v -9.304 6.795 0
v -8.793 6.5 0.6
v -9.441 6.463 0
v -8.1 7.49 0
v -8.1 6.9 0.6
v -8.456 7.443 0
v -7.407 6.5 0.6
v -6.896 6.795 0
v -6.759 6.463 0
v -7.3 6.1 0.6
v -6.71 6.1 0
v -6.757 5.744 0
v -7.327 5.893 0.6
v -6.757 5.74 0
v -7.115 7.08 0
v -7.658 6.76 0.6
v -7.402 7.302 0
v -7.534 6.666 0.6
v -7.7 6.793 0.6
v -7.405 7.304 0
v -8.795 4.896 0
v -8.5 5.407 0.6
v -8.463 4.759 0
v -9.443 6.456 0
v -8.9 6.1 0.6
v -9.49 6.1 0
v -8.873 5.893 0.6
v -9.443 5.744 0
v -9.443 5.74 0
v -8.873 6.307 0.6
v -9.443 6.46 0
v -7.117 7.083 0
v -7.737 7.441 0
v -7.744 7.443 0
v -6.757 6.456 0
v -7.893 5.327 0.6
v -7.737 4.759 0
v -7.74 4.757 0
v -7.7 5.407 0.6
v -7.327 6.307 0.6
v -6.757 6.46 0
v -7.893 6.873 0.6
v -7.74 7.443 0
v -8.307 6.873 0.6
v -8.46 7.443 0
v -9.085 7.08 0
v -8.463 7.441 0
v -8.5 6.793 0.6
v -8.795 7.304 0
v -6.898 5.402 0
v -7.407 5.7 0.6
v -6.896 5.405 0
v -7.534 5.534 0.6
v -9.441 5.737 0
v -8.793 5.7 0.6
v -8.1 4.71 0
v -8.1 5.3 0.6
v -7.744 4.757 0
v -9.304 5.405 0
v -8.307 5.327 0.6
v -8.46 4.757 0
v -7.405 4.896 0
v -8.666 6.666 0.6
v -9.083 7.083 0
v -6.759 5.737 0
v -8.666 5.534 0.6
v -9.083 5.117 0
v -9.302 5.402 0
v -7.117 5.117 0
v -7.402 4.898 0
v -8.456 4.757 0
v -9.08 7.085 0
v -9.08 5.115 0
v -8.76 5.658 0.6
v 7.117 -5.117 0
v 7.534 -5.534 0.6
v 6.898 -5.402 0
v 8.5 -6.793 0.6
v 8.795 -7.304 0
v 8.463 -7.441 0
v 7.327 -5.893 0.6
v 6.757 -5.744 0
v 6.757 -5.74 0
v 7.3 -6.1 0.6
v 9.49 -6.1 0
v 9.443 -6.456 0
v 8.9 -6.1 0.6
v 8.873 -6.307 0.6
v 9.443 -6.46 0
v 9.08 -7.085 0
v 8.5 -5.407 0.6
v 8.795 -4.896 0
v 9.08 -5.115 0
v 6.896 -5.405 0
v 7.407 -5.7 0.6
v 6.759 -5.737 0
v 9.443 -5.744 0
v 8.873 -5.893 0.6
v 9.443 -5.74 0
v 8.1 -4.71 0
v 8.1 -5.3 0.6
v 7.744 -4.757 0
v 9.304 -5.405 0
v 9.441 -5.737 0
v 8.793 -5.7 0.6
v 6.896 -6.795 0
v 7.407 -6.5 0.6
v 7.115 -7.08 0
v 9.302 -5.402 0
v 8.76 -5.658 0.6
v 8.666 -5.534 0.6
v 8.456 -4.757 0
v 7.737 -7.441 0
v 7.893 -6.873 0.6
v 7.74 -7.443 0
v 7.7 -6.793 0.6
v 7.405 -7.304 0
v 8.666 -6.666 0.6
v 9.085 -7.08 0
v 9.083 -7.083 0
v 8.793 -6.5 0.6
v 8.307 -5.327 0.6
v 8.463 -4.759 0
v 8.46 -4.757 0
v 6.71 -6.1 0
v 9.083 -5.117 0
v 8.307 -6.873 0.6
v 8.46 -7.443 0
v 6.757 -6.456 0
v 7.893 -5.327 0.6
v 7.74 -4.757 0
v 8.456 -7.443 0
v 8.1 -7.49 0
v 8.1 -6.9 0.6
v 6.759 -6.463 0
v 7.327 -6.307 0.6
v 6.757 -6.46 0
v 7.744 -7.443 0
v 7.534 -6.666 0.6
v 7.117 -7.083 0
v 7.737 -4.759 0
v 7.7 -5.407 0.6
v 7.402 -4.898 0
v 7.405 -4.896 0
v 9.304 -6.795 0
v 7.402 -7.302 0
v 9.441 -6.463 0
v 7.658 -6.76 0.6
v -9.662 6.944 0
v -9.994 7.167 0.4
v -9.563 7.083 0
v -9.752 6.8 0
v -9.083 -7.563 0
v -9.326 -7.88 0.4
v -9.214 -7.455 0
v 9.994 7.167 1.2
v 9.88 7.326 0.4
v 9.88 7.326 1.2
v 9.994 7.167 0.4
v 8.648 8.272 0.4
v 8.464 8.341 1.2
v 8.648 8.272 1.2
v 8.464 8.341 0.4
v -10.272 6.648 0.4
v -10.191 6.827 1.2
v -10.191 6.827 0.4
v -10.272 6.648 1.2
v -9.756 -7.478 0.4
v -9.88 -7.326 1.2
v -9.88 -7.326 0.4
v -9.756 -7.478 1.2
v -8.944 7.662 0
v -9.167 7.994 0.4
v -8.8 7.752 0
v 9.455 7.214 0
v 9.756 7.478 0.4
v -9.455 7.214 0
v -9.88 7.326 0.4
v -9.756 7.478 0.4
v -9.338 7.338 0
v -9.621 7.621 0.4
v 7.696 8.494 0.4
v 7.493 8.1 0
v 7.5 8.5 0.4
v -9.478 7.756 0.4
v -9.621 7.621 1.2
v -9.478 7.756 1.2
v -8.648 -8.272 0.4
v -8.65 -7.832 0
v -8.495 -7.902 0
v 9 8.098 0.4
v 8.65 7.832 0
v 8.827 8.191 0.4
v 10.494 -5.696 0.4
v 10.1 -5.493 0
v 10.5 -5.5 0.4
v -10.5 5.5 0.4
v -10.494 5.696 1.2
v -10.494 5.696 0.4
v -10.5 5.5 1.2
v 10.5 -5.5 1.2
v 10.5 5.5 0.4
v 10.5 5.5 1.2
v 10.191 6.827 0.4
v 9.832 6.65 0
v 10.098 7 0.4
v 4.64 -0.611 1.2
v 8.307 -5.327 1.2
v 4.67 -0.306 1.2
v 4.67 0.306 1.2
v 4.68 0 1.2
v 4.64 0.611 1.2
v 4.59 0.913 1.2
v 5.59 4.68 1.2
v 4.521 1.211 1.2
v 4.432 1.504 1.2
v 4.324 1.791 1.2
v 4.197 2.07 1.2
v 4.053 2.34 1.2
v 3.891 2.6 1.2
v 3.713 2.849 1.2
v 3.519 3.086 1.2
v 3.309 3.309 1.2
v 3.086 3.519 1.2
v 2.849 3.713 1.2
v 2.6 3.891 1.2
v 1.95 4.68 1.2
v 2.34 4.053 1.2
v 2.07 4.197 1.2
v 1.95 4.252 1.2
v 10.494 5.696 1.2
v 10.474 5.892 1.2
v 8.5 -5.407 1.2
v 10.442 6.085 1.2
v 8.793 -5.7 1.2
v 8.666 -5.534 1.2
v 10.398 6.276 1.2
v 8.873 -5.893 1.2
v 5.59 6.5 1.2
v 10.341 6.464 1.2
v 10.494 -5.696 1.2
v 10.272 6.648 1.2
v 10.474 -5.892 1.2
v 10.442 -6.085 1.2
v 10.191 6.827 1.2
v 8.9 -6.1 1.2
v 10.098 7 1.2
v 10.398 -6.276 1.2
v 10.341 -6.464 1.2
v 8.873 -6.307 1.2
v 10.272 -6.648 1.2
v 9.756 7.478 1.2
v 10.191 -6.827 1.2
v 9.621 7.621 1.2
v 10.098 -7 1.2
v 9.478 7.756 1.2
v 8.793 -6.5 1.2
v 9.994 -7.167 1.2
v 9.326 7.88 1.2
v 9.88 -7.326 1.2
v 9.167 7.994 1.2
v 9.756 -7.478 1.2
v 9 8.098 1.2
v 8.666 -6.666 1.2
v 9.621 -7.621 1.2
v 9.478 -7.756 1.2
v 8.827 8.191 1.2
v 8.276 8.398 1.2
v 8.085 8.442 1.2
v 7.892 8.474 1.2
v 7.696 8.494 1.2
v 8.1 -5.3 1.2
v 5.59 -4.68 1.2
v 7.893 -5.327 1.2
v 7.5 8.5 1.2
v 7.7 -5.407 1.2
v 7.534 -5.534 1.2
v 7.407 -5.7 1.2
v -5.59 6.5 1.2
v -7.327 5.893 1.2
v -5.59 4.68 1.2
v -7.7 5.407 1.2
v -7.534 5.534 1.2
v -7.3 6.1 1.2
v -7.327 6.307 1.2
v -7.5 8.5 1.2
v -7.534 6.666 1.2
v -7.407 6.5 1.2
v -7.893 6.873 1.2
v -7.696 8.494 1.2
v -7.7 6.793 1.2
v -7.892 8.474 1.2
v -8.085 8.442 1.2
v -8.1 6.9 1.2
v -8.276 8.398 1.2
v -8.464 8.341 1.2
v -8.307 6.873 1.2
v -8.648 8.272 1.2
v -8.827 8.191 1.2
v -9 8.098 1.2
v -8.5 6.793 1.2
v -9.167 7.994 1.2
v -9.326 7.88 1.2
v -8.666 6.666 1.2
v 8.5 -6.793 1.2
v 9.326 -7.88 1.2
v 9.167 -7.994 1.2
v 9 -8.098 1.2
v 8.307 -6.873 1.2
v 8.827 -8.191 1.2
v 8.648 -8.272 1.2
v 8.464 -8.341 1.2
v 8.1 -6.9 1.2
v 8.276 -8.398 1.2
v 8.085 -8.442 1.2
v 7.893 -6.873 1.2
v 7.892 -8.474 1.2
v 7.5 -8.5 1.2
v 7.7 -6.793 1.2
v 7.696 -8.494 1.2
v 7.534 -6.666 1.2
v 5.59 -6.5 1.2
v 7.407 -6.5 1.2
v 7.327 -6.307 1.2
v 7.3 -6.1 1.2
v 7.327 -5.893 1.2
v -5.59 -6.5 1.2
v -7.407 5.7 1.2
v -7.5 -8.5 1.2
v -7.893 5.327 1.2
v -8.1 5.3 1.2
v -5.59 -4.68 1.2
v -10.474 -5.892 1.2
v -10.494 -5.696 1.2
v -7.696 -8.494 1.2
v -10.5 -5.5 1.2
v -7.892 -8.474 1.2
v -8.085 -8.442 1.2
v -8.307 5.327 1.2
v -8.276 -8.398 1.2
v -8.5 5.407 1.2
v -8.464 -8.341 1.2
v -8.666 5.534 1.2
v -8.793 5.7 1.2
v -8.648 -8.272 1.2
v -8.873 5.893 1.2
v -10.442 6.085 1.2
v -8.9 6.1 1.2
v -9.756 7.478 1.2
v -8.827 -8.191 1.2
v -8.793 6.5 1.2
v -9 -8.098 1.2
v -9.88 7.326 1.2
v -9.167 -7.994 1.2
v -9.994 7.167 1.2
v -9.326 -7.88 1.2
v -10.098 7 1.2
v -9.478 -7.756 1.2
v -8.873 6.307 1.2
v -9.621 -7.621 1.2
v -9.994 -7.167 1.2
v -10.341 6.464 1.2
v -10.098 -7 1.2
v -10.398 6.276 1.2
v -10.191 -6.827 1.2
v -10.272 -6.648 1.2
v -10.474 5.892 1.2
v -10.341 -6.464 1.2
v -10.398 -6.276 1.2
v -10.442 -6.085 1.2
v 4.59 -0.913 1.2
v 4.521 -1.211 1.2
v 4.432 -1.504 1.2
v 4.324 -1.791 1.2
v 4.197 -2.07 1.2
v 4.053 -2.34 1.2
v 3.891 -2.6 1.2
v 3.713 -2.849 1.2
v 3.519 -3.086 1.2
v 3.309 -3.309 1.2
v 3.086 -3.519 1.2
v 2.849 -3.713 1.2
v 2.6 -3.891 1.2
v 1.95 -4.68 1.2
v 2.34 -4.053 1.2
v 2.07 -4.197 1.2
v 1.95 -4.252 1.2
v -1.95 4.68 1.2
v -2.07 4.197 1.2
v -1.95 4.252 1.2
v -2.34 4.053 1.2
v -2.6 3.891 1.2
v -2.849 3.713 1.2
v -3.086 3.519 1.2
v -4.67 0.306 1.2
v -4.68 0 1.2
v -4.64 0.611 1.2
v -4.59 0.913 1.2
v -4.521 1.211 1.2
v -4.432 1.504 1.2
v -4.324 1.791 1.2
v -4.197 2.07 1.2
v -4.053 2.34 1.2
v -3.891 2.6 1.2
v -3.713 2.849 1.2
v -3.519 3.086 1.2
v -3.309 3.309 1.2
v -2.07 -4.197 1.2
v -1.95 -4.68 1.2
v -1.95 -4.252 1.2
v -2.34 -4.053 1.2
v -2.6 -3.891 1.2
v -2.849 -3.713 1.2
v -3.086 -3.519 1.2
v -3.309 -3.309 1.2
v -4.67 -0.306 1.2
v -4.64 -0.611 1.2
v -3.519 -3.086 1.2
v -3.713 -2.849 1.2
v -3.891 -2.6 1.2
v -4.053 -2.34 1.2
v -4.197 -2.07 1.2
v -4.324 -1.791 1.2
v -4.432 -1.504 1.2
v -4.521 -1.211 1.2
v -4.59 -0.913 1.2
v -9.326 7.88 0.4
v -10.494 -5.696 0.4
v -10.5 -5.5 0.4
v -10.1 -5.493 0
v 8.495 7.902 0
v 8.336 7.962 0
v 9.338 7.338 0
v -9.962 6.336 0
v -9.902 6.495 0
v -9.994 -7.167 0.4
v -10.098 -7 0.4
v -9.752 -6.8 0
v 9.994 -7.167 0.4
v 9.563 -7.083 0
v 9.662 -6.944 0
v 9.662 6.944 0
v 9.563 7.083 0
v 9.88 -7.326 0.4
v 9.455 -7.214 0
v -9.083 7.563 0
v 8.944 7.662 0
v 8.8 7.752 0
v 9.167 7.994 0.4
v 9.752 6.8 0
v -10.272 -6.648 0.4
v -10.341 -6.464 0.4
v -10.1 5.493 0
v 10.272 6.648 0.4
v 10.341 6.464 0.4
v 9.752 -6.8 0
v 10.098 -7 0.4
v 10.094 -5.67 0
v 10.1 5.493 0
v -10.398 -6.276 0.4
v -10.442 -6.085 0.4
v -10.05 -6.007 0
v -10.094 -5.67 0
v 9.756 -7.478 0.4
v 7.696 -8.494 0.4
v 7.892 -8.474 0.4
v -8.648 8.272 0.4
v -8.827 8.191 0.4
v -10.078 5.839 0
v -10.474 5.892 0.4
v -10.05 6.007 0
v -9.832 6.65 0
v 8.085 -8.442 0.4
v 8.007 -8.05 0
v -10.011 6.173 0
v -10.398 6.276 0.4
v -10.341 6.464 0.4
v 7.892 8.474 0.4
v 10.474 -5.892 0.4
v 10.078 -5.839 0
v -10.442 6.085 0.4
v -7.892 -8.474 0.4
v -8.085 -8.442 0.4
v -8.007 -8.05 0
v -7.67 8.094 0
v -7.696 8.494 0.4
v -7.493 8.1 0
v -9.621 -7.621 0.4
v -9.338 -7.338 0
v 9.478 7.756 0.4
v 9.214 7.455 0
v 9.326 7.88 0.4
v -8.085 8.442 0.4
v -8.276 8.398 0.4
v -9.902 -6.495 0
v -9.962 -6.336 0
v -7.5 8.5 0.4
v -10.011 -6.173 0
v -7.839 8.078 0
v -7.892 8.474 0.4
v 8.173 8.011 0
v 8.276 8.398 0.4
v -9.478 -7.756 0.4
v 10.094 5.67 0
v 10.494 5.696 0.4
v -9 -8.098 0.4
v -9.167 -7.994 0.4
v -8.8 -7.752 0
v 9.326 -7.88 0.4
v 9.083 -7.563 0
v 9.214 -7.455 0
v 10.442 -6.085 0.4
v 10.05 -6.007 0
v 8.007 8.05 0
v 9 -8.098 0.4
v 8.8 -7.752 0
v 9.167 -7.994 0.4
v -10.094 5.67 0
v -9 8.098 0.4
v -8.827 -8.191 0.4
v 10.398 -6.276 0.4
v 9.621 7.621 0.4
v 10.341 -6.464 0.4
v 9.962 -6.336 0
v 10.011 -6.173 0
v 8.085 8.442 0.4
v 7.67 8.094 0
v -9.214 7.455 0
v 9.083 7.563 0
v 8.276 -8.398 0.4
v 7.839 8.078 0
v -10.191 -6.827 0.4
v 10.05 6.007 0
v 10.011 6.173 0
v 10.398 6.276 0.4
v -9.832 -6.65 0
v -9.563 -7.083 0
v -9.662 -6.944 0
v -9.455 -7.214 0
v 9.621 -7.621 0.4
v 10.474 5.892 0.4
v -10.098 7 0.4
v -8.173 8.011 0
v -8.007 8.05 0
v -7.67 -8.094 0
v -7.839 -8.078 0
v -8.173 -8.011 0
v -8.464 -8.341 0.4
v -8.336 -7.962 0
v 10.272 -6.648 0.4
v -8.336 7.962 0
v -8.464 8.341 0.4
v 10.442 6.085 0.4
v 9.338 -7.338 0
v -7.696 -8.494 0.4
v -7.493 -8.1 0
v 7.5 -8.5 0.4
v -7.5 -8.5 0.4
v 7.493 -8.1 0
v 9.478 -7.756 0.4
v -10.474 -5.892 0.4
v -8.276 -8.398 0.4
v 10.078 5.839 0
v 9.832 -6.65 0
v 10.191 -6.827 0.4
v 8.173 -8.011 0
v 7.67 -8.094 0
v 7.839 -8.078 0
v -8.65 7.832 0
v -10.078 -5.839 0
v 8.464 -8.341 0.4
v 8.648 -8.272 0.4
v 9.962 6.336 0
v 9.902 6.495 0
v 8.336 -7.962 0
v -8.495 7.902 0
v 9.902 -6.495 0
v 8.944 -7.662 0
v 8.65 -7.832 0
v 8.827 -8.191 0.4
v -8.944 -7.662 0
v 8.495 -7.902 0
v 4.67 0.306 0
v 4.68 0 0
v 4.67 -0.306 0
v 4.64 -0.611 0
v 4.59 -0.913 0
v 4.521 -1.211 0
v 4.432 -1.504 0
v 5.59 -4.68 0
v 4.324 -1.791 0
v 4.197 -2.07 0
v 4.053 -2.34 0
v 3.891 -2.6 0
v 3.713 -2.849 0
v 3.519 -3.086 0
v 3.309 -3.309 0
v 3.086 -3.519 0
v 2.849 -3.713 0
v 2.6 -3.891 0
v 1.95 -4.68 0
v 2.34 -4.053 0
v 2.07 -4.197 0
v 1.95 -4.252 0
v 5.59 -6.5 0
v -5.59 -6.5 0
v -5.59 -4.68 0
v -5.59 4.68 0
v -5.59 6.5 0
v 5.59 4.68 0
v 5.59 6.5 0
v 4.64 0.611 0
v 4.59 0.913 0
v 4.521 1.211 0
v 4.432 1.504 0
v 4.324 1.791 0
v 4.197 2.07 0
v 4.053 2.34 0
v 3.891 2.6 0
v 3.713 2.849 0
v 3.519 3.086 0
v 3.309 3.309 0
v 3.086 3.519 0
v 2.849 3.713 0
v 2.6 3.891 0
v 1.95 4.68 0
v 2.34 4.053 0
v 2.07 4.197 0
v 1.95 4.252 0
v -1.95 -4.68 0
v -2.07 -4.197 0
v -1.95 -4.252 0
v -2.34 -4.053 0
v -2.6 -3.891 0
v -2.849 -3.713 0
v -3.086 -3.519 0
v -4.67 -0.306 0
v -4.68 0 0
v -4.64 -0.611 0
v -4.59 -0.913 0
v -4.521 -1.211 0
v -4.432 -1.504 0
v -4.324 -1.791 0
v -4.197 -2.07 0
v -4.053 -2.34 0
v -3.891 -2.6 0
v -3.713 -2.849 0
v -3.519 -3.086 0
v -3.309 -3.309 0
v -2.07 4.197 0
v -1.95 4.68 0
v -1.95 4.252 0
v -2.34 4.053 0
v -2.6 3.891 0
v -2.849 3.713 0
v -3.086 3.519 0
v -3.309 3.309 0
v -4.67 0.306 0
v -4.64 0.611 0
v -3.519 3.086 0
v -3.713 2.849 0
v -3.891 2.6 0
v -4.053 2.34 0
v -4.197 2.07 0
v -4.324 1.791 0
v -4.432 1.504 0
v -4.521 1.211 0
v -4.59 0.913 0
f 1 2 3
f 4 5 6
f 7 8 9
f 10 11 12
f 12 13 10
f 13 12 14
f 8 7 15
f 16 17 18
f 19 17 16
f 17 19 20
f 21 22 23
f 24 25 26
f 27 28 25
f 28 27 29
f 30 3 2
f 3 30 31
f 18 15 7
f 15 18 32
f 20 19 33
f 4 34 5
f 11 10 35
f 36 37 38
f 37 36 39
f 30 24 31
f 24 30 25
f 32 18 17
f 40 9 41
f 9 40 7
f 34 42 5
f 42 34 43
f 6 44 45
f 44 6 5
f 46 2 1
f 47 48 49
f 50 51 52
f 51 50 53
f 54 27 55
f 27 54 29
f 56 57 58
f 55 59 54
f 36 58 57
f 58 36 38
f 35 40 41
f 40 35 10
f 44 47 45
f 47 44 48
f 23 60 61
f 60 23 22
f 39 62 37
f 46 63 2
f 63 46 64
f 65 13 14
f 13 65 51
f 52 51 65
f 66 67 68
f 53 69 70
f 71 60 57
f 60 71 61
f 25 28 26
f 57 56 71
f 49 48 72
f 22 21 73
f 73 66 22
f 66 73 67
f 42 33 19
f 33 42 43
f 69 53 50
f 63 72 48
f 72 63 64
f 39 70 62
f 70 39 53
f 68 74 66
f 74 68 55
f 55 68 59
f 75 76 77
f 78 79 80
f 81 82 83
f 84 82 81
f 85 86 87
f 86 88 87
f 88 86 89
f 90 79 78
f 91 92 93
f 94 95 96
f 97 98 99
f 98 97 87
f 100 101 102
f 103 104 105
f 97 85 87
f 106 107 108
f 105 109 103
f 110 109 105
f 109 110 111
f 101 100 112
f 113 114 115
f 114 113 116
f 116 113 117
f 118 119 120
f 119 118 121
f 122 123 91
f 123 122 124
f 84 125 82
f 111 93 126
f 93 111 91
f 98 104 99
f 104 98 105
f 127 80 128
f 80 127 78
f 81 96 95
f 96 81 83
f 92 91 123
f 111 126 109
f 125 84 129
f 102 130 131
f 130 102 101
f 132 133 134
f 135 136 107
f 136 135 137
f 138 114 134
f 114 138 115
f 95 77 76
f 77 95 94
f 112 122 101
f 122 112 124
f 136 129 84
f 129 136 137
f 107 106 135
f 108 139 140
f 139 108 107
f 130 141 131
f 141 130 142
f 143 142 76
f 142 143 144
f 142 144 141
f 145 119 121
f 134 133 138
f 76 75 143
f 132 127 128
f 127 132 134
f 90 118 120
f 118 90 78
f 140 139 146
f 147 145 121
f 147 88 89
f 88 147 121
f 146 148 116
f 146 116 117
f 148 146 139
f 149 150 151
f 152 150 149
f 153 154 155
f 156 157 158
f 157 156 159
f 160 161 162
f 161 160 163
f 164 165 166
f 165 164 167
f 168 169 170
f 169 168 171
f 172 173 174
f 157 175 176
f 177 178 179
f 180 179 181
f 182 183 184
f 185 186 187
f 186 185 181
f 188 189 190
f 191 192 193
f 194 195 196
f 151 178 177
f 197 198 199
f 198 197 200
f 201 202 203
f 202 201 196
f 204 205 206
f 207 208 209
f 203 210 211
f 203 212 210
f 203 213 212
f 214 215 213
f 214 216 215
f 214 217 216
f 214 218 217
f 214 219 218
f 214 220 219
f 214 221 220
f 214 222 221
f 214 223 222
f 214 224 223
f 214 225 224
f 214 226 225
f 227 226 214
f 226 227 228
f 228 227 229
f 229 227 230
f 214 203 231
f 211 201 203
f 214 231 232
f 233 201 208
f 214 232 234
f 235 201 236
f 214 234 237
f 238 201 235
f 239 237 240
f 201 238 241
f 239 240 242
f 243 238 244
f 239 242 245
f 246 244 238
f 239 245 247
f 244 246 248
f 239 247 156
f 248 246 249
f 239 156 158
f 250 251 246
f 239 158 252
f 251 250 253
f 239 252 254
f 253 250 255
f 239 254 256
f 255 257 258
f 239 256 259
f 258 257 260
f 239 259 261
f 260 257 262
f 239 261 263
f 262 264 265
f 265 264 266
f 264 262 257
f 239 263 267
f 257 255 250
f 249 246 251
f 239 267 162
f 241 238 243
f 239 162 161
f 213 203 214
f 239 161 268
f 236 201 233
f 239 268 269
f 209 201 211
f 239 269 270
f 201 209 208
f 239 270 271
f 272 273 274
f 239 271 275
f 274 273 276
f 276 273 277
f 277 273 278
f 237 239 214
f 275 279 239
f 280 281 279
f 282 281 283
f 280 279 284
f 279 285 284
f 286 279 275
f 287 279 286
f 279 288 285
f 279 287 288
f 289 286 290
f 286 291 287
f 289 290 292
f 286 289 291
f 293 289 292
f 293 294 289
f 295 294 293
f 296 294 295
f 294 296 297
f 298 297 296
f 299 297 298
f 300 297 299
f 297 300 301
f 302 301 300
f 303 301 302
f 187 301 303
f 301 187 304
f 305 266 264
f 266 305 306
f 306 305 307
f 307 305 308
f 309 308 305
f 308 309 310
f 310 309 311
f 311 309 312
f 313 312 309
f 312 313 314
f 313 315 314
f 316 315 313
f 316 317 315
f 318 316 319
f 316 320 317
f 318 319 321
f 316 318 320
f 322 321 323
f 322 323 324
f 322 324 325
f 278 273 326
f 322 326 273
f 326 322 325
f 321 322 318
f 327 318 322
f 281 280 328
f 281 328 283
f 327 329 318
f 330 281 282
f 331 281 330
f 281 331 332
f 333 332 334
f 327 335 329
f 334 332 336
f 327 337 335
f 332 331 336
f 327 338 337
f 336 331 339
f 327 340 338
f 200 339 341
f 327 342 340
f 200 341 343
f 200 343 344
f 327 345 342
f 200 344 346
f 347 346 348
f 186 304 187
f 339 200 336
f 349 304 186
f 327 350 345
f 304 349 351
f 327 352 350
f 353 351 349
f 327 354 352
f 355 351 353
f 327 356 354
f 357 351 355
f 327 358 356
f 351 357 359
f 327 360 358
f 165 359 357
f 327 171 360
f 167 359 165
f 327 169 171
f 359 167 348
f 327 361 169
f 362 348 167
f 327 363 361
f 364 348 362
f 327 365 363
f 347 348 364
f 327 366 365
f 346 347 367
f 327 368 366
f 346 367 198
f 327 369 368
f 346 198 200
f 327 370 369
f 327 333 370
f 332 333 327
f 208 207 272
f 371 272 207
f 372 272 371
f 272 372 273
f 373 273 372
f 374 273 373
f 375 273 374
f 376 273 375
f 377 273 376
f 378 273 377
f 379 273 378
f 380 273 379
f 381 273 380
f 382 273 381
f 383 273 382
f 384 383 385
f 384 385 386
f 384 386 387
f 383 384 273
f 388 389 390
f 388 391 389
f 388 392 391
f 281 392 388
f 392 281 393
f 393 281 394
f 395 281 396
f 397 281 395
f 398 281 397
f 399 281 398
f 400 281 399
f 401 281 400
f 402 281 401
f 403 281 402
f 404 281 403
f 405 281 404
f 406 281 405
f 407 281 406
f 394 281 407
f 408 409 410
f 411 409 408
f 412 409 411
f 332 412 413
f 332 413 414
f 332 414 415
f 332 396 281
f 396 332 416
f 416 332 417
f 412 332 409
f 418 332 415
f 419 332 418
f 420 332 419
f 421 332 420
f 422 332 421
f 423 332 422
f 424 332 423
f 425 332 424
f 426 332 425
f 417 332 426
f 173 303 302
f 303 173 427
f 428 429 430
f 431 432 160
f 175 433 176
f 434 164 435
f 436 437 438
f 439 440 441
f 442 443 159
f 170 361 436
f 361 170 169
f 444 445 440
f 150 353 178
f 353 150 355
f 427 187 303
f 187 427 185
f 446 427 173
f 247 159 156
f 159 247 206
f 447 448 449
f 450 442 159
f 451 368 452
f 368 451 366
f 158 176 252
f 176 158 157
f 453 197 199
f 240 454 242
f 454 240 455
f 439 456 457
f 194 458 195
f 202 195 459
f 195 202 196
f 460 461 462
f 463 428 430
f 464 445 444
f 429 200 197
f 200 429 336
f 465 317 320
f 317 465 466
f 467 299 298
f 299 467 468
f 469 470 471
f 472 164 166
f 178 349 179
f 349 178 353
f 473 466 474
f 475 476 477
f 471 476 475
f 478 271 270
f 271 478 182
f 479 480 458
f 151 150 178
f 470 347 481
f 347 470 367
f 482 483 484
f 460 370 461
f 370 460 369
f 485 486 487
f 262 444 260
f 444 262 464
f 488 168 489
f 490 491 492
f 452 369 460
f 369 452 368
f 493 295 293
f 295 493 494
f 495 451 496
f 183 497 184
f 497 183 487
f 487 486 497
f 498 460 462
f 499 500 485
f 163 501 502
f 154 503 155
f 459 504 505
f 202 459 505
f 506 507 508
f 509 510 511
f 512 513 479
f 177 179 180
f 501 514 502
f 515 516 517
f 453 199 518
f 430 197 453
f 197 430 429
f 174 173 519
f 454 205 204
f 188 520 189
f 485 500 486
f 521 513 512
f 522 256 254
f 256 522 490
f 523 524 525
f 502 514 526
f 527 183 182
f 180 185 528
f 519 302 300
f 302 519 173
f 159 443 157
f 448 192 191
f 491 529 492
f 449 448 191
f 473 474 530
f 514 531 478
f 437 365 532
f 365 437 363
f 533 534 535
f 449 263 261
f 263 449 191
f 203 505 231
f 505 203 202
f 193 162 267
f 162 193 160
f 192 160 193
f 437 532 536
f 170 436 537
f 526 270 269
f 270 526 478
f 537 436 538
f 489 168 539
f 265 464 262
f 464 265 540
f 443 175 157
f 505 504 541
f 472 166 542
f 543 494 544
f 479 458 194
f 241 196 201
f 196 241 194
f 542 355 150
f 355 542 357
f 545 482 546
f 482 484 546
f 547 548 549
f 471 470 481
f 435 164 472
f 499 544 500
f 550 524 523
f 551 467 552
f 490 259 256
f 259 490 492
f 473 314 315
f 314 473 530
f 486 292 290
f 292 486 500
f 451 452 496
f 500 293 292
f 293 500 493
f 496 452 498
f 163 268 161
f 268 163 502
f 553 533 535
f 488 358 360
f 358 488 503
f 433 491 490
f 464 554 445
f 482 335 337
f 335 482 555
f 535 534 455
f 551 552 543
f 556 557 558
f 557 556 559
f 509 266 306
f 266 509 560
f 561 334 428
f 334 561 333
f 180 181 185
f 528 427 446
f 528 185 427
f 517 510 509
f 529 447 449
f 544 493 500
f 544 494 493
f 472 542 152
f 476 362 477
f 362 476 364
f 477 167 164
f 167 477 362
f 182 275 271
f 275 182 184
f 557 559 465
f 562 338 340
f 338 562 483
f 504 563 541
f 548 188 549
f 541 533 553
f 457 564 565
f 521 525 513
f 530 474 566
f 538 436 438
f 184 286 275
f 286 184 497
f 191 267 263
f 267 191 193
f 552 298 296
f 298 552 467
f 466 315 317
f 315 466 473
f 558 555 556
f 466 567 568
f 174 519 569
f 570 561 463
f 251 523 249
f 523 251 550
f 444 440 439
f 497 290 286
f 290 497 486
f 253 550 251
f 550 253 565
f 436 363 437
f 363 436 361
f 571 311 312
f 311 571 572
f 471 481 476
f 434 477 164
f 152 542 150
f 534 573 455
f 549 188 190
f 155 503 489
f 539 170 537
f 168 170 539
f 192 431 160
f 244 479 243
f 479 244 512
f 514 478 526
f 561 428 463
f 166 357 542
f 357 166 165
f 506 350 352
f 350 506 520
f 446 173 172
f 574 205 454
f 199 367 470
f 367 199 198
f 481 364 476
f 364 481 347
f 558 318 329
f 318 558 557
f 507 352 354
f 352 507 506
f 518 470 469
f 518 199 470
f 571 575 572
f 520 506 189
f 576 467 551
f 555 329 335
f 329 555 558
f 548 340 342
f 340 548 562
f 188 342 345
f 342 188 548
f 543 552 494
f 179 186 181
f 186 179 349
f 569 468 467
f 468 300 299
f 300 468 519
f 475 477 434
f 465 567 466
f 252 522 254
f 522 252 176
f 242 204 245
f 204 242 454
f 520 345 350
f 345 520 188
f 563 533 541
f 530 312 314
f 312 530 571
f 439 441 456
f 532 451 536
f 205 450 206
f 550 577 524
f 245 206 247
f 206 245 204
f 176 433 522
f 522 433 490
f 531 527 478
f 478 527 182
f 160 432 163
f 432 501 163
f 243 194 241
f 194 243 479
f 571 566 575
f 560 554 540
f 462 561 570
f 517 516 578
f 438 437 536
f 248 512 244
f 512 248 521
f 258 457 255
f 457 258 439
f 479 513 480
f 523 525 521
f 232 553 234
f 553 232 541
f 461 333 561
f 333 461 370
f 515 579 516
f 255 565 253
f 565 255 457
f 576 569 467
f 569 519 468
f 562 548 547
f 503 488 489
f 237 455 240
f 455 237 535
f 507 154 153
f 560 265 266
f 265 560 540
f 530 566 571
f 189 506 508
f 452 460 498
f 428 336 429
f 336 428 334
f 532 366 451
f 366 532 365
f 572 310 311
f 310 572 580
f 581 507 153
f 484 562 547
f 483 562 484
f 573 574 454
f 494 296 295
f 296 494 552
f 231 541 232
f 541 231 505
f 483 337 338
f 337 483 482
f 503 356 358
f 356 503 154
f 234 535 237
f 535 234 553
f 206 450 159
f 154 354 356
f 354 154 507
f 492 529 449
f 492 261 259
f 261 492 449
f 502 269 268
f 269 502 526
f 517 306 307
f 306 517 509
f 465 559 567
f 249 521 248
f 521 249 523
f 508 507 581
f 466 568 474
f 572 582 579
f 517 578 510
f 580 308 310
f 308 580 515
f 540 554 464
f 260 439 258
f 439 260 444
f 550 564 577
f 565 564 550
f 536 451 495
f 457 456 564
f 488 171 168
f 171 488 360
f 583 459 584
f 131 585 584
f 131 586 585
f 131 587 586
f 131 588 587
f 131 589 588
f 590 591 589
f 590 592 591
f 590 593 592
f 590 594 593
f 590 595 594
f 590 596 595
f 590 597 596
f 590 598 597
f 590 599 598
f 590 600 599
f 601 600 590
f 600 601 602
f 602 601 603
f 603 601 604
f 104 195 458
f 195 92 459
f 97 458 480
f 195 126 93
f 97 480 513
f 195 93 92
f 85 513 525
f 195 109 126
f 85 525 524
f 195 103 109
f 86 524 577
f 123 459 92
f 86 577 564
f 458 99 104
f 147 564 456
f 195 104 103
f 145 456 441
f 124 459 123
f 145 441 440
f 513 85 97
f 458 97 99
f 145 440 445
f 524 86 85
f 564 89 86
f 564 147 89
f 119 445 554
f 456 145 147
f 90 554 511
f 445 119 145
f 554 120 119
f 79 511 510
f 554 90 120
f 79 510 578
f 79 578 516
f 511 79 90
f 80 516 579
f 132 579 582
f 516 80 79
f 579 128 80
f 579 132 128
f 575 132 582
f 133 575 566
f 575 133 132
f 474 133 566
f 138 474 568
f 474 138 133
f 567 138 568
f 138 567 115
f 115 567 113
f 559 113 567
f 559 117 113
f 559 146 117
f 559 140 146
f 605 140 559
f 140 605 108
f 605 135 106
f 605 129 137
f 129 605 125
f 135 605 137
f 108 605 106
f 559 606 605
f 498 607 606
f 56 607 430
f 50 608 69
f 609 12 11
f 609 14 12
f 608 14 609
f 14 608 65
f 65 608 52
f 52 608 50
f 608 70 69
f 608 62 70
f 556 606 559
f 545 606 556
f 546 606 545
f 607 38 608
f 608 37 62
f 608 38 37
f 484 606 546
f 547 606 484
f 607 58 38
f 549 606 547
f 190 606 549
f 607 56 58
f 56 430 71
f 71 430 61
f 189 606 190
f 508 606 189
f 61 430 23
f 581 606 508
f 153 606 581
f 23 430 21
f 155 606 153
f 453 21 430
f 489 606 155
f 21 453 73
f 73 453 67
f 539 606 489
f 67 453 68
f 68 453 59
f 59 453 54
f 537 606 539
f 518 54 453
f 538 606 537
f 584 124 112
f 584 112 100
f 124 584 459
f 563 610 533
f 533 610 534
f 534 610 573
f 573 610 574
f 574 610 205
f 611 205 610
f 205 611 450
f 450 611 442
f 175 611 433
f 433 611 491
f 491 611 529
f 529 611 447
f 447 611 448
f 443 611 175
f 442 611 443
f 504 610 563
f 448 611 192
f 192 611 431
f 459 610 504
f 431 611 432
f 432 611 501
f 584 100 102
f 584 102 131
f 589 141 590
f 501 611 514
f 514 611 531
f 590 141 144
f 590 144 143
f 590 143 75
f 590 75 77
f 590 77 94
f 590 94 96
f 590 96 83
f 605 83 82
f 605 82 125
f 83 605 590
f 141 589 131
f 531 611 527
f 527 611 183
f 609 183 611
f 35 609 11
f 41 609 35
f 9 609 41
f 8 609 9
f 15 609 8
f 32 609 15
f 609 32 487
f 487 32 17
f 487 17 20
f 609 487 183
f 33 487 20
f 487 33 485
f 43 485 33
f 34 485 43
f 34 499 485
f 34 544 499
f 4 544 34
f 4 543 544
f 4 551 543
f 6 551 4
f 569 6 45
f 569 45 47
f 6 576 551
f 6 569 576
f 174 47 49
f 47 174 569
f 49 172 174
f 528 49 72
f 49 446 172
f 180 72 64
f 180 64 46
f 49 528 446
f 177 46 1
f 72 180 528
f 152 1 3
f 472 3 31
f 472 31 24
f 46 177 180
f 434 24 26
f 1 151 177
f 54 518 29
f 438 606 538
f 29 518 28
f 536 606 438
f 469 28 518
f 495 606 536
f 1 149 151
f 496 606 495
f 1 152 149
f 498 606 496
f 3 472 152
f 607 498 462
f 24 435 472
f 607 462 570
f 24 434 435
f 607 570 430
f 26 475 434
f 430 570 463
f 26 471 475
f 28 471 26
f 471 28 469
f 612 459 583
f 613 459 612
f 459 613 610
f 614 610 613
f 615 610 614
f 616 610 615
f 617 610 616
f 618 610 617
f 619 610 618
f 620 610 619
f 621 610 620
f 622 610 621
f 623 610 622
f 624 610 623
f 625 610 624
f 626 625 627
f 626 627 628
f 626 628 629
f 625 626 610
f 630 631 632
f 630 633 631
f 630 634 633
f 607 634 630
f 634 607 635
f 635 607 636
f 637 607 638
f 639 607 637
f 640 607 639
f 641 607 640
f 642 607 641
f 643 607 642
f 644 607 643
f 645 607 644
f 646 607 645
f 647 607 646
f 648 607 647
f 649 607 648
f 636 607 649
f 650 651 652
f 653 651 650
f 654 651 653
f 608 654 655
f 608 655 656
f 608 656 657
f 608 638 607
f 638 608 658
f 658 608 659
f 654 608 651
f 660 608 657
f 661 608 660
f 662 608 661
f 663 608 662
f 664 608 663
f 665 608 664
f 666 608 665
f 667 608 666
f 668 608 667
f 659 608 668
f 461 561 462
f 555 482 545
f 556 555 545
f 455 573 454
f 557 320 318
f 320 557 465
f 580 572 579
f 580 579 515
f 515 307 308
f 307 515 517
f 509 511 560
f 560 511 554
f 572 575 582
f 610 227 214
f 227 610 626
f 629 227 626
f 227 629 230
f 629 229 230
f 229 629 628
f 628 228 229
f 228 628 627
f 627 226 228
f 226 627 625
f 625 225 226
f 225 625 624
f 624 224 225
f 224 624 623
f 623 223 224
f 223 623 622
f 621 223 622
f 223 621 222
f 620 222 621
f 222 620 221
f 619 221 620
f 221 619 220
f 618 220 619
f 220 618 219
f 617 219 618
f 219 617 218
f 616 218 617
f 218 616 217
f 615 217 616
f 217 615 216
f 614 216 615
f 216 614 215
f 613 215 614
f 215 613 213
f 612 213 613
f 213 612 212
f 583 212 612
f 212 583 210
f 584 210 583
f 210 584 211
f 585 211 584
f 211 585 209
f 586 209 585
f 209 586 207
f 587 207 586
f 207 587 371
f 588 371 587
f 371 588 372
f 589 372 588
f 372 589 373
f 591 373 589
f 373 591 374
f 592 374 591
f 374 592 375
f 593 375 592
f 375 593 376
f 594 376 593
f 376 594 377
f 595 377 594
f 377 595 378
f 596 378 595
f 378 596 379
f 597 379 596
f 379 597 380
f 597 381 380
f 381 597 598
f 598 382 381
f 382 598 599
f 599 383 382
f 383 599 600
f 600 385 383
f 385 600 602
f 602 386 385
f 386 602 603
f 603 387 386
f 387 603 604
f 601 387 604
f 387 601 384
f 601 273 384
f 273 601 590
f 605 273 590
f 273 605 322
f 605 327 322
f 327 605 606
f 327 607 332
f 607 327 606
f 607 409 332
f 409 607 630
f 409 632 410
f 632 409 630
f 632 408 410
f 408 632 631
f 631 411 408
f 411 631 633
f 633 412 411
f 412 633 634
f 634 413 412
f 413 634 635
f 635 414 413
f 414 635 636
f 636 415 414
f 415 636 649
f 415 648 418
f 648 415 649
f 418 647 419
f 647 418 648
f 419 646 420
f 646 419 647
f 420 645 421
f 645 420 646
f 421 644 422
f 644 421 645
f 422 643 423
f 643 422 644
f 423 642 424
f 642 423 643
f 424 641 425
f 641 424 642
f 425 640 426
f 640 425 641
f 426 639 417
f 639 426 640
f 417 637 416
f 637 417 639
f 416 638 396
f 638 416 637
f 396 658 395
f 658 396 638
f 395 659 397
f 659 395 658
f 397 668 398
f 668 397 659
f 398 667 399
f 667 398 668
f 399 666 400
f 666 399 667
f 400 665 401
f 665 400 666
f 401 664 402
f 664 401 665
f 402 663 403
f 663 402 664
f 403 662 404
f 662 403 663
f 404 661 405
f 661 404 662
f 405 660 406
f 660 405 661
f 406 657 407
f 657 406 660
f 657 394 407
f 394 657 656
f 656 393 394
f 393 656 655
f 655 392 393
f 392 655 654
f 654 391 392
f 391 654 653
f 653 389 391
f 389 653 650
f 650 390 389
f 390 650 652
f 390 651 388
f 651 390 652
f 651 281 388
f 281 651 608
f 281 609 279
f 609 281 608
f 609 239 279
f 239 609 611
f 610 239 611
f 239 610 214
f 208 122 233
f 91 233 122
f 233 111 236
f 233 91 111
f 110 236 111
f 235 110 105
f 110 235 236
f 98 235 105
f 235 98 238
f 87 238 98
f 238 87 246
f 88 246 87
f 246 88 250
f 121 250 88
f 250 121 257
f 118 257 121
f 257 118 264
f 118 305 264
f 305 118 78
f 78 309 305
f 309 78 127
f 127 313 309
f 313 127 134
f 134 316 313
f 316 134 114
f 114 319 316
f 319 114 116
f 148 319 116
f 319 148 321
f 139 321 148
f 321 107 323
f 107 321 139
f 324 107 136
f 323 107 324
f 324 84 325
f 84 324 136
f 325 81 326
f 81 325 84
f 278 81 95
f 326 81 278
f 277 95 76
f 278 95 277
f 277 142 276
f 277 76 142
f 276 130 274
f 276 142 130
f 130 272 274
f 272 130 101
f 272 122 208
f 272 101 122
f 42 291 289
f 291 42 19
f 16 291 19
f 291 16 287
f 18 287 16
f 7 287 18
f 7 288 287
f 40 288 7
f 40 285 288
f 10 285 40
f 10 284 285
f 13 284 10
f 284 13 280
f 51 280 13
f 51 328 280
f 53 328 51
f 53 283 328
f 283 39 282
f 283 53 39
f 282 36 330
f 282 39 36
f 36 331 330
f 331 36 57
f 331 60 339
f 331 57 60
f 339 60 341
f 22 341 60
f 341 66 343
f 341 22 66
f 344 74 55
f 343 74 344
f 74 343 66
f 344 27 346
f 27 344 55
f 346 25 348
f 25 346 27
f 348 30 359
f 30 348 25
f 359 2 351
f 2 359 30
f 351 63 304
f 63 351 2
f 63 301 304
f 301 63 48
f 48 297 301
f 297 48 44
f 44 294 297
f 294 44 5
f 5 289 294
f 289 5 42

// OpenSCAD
// Emblem parts: opaque bezel (cap) and translucent green lens.
include <gl_lib.scad>
part = "bezel";  // "bezel" | "lens" | "center"
if (layout == "assembly") { if (part == "bezel") bezel(); else if (part == "center") emblem_center(); else lens(); }
else if (part == "bezel")  face_down(y_top) bezel();     // visible face on the (smooth) bed
else if (part == "center") face_down(y_top) emblem_center();
else face_up(y_ins1) lens();                             // symbol boss up
